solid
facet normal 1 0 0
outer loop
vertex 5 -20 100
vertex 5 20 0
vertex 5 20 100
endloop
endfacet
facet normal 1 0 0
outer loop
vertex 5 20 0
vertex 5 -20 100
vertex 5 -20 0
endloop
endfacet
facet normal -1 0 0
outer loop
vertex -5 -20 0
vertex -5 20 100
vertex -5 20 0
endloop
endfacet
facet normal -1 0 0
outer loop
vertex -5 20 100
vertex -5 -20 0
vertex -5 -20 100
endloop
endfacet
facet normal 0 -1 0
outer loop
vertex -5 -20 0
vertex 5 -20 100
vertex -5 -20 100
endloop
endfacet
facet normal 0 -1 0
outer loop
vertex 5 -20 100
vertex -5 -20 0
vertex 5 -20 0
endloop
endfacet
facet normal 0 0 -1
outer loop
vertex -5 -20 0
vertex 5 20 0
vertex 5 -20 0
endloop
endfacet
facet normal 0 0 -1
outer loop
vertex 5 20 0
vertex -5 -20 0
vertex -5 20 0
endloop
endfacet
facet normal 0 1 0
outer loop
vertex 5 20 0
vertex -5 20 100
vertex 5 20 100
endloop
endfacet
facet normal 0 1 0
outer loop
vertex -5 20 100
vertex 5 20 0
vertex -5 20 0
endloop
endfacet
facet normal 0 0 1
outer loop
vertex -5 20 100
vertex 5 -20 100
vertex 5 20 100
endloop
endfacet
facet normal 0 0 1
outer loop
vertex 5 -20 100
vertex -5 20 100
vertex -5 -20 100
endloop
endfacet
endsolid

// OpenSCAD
module FlipFeature(){
  translate([0, 0, 50])rotate([0, 90, 0])translate([-50, -20, -5])cube([100, 40, 10]);}
$fn=64;
color("red")FlipFeature();
